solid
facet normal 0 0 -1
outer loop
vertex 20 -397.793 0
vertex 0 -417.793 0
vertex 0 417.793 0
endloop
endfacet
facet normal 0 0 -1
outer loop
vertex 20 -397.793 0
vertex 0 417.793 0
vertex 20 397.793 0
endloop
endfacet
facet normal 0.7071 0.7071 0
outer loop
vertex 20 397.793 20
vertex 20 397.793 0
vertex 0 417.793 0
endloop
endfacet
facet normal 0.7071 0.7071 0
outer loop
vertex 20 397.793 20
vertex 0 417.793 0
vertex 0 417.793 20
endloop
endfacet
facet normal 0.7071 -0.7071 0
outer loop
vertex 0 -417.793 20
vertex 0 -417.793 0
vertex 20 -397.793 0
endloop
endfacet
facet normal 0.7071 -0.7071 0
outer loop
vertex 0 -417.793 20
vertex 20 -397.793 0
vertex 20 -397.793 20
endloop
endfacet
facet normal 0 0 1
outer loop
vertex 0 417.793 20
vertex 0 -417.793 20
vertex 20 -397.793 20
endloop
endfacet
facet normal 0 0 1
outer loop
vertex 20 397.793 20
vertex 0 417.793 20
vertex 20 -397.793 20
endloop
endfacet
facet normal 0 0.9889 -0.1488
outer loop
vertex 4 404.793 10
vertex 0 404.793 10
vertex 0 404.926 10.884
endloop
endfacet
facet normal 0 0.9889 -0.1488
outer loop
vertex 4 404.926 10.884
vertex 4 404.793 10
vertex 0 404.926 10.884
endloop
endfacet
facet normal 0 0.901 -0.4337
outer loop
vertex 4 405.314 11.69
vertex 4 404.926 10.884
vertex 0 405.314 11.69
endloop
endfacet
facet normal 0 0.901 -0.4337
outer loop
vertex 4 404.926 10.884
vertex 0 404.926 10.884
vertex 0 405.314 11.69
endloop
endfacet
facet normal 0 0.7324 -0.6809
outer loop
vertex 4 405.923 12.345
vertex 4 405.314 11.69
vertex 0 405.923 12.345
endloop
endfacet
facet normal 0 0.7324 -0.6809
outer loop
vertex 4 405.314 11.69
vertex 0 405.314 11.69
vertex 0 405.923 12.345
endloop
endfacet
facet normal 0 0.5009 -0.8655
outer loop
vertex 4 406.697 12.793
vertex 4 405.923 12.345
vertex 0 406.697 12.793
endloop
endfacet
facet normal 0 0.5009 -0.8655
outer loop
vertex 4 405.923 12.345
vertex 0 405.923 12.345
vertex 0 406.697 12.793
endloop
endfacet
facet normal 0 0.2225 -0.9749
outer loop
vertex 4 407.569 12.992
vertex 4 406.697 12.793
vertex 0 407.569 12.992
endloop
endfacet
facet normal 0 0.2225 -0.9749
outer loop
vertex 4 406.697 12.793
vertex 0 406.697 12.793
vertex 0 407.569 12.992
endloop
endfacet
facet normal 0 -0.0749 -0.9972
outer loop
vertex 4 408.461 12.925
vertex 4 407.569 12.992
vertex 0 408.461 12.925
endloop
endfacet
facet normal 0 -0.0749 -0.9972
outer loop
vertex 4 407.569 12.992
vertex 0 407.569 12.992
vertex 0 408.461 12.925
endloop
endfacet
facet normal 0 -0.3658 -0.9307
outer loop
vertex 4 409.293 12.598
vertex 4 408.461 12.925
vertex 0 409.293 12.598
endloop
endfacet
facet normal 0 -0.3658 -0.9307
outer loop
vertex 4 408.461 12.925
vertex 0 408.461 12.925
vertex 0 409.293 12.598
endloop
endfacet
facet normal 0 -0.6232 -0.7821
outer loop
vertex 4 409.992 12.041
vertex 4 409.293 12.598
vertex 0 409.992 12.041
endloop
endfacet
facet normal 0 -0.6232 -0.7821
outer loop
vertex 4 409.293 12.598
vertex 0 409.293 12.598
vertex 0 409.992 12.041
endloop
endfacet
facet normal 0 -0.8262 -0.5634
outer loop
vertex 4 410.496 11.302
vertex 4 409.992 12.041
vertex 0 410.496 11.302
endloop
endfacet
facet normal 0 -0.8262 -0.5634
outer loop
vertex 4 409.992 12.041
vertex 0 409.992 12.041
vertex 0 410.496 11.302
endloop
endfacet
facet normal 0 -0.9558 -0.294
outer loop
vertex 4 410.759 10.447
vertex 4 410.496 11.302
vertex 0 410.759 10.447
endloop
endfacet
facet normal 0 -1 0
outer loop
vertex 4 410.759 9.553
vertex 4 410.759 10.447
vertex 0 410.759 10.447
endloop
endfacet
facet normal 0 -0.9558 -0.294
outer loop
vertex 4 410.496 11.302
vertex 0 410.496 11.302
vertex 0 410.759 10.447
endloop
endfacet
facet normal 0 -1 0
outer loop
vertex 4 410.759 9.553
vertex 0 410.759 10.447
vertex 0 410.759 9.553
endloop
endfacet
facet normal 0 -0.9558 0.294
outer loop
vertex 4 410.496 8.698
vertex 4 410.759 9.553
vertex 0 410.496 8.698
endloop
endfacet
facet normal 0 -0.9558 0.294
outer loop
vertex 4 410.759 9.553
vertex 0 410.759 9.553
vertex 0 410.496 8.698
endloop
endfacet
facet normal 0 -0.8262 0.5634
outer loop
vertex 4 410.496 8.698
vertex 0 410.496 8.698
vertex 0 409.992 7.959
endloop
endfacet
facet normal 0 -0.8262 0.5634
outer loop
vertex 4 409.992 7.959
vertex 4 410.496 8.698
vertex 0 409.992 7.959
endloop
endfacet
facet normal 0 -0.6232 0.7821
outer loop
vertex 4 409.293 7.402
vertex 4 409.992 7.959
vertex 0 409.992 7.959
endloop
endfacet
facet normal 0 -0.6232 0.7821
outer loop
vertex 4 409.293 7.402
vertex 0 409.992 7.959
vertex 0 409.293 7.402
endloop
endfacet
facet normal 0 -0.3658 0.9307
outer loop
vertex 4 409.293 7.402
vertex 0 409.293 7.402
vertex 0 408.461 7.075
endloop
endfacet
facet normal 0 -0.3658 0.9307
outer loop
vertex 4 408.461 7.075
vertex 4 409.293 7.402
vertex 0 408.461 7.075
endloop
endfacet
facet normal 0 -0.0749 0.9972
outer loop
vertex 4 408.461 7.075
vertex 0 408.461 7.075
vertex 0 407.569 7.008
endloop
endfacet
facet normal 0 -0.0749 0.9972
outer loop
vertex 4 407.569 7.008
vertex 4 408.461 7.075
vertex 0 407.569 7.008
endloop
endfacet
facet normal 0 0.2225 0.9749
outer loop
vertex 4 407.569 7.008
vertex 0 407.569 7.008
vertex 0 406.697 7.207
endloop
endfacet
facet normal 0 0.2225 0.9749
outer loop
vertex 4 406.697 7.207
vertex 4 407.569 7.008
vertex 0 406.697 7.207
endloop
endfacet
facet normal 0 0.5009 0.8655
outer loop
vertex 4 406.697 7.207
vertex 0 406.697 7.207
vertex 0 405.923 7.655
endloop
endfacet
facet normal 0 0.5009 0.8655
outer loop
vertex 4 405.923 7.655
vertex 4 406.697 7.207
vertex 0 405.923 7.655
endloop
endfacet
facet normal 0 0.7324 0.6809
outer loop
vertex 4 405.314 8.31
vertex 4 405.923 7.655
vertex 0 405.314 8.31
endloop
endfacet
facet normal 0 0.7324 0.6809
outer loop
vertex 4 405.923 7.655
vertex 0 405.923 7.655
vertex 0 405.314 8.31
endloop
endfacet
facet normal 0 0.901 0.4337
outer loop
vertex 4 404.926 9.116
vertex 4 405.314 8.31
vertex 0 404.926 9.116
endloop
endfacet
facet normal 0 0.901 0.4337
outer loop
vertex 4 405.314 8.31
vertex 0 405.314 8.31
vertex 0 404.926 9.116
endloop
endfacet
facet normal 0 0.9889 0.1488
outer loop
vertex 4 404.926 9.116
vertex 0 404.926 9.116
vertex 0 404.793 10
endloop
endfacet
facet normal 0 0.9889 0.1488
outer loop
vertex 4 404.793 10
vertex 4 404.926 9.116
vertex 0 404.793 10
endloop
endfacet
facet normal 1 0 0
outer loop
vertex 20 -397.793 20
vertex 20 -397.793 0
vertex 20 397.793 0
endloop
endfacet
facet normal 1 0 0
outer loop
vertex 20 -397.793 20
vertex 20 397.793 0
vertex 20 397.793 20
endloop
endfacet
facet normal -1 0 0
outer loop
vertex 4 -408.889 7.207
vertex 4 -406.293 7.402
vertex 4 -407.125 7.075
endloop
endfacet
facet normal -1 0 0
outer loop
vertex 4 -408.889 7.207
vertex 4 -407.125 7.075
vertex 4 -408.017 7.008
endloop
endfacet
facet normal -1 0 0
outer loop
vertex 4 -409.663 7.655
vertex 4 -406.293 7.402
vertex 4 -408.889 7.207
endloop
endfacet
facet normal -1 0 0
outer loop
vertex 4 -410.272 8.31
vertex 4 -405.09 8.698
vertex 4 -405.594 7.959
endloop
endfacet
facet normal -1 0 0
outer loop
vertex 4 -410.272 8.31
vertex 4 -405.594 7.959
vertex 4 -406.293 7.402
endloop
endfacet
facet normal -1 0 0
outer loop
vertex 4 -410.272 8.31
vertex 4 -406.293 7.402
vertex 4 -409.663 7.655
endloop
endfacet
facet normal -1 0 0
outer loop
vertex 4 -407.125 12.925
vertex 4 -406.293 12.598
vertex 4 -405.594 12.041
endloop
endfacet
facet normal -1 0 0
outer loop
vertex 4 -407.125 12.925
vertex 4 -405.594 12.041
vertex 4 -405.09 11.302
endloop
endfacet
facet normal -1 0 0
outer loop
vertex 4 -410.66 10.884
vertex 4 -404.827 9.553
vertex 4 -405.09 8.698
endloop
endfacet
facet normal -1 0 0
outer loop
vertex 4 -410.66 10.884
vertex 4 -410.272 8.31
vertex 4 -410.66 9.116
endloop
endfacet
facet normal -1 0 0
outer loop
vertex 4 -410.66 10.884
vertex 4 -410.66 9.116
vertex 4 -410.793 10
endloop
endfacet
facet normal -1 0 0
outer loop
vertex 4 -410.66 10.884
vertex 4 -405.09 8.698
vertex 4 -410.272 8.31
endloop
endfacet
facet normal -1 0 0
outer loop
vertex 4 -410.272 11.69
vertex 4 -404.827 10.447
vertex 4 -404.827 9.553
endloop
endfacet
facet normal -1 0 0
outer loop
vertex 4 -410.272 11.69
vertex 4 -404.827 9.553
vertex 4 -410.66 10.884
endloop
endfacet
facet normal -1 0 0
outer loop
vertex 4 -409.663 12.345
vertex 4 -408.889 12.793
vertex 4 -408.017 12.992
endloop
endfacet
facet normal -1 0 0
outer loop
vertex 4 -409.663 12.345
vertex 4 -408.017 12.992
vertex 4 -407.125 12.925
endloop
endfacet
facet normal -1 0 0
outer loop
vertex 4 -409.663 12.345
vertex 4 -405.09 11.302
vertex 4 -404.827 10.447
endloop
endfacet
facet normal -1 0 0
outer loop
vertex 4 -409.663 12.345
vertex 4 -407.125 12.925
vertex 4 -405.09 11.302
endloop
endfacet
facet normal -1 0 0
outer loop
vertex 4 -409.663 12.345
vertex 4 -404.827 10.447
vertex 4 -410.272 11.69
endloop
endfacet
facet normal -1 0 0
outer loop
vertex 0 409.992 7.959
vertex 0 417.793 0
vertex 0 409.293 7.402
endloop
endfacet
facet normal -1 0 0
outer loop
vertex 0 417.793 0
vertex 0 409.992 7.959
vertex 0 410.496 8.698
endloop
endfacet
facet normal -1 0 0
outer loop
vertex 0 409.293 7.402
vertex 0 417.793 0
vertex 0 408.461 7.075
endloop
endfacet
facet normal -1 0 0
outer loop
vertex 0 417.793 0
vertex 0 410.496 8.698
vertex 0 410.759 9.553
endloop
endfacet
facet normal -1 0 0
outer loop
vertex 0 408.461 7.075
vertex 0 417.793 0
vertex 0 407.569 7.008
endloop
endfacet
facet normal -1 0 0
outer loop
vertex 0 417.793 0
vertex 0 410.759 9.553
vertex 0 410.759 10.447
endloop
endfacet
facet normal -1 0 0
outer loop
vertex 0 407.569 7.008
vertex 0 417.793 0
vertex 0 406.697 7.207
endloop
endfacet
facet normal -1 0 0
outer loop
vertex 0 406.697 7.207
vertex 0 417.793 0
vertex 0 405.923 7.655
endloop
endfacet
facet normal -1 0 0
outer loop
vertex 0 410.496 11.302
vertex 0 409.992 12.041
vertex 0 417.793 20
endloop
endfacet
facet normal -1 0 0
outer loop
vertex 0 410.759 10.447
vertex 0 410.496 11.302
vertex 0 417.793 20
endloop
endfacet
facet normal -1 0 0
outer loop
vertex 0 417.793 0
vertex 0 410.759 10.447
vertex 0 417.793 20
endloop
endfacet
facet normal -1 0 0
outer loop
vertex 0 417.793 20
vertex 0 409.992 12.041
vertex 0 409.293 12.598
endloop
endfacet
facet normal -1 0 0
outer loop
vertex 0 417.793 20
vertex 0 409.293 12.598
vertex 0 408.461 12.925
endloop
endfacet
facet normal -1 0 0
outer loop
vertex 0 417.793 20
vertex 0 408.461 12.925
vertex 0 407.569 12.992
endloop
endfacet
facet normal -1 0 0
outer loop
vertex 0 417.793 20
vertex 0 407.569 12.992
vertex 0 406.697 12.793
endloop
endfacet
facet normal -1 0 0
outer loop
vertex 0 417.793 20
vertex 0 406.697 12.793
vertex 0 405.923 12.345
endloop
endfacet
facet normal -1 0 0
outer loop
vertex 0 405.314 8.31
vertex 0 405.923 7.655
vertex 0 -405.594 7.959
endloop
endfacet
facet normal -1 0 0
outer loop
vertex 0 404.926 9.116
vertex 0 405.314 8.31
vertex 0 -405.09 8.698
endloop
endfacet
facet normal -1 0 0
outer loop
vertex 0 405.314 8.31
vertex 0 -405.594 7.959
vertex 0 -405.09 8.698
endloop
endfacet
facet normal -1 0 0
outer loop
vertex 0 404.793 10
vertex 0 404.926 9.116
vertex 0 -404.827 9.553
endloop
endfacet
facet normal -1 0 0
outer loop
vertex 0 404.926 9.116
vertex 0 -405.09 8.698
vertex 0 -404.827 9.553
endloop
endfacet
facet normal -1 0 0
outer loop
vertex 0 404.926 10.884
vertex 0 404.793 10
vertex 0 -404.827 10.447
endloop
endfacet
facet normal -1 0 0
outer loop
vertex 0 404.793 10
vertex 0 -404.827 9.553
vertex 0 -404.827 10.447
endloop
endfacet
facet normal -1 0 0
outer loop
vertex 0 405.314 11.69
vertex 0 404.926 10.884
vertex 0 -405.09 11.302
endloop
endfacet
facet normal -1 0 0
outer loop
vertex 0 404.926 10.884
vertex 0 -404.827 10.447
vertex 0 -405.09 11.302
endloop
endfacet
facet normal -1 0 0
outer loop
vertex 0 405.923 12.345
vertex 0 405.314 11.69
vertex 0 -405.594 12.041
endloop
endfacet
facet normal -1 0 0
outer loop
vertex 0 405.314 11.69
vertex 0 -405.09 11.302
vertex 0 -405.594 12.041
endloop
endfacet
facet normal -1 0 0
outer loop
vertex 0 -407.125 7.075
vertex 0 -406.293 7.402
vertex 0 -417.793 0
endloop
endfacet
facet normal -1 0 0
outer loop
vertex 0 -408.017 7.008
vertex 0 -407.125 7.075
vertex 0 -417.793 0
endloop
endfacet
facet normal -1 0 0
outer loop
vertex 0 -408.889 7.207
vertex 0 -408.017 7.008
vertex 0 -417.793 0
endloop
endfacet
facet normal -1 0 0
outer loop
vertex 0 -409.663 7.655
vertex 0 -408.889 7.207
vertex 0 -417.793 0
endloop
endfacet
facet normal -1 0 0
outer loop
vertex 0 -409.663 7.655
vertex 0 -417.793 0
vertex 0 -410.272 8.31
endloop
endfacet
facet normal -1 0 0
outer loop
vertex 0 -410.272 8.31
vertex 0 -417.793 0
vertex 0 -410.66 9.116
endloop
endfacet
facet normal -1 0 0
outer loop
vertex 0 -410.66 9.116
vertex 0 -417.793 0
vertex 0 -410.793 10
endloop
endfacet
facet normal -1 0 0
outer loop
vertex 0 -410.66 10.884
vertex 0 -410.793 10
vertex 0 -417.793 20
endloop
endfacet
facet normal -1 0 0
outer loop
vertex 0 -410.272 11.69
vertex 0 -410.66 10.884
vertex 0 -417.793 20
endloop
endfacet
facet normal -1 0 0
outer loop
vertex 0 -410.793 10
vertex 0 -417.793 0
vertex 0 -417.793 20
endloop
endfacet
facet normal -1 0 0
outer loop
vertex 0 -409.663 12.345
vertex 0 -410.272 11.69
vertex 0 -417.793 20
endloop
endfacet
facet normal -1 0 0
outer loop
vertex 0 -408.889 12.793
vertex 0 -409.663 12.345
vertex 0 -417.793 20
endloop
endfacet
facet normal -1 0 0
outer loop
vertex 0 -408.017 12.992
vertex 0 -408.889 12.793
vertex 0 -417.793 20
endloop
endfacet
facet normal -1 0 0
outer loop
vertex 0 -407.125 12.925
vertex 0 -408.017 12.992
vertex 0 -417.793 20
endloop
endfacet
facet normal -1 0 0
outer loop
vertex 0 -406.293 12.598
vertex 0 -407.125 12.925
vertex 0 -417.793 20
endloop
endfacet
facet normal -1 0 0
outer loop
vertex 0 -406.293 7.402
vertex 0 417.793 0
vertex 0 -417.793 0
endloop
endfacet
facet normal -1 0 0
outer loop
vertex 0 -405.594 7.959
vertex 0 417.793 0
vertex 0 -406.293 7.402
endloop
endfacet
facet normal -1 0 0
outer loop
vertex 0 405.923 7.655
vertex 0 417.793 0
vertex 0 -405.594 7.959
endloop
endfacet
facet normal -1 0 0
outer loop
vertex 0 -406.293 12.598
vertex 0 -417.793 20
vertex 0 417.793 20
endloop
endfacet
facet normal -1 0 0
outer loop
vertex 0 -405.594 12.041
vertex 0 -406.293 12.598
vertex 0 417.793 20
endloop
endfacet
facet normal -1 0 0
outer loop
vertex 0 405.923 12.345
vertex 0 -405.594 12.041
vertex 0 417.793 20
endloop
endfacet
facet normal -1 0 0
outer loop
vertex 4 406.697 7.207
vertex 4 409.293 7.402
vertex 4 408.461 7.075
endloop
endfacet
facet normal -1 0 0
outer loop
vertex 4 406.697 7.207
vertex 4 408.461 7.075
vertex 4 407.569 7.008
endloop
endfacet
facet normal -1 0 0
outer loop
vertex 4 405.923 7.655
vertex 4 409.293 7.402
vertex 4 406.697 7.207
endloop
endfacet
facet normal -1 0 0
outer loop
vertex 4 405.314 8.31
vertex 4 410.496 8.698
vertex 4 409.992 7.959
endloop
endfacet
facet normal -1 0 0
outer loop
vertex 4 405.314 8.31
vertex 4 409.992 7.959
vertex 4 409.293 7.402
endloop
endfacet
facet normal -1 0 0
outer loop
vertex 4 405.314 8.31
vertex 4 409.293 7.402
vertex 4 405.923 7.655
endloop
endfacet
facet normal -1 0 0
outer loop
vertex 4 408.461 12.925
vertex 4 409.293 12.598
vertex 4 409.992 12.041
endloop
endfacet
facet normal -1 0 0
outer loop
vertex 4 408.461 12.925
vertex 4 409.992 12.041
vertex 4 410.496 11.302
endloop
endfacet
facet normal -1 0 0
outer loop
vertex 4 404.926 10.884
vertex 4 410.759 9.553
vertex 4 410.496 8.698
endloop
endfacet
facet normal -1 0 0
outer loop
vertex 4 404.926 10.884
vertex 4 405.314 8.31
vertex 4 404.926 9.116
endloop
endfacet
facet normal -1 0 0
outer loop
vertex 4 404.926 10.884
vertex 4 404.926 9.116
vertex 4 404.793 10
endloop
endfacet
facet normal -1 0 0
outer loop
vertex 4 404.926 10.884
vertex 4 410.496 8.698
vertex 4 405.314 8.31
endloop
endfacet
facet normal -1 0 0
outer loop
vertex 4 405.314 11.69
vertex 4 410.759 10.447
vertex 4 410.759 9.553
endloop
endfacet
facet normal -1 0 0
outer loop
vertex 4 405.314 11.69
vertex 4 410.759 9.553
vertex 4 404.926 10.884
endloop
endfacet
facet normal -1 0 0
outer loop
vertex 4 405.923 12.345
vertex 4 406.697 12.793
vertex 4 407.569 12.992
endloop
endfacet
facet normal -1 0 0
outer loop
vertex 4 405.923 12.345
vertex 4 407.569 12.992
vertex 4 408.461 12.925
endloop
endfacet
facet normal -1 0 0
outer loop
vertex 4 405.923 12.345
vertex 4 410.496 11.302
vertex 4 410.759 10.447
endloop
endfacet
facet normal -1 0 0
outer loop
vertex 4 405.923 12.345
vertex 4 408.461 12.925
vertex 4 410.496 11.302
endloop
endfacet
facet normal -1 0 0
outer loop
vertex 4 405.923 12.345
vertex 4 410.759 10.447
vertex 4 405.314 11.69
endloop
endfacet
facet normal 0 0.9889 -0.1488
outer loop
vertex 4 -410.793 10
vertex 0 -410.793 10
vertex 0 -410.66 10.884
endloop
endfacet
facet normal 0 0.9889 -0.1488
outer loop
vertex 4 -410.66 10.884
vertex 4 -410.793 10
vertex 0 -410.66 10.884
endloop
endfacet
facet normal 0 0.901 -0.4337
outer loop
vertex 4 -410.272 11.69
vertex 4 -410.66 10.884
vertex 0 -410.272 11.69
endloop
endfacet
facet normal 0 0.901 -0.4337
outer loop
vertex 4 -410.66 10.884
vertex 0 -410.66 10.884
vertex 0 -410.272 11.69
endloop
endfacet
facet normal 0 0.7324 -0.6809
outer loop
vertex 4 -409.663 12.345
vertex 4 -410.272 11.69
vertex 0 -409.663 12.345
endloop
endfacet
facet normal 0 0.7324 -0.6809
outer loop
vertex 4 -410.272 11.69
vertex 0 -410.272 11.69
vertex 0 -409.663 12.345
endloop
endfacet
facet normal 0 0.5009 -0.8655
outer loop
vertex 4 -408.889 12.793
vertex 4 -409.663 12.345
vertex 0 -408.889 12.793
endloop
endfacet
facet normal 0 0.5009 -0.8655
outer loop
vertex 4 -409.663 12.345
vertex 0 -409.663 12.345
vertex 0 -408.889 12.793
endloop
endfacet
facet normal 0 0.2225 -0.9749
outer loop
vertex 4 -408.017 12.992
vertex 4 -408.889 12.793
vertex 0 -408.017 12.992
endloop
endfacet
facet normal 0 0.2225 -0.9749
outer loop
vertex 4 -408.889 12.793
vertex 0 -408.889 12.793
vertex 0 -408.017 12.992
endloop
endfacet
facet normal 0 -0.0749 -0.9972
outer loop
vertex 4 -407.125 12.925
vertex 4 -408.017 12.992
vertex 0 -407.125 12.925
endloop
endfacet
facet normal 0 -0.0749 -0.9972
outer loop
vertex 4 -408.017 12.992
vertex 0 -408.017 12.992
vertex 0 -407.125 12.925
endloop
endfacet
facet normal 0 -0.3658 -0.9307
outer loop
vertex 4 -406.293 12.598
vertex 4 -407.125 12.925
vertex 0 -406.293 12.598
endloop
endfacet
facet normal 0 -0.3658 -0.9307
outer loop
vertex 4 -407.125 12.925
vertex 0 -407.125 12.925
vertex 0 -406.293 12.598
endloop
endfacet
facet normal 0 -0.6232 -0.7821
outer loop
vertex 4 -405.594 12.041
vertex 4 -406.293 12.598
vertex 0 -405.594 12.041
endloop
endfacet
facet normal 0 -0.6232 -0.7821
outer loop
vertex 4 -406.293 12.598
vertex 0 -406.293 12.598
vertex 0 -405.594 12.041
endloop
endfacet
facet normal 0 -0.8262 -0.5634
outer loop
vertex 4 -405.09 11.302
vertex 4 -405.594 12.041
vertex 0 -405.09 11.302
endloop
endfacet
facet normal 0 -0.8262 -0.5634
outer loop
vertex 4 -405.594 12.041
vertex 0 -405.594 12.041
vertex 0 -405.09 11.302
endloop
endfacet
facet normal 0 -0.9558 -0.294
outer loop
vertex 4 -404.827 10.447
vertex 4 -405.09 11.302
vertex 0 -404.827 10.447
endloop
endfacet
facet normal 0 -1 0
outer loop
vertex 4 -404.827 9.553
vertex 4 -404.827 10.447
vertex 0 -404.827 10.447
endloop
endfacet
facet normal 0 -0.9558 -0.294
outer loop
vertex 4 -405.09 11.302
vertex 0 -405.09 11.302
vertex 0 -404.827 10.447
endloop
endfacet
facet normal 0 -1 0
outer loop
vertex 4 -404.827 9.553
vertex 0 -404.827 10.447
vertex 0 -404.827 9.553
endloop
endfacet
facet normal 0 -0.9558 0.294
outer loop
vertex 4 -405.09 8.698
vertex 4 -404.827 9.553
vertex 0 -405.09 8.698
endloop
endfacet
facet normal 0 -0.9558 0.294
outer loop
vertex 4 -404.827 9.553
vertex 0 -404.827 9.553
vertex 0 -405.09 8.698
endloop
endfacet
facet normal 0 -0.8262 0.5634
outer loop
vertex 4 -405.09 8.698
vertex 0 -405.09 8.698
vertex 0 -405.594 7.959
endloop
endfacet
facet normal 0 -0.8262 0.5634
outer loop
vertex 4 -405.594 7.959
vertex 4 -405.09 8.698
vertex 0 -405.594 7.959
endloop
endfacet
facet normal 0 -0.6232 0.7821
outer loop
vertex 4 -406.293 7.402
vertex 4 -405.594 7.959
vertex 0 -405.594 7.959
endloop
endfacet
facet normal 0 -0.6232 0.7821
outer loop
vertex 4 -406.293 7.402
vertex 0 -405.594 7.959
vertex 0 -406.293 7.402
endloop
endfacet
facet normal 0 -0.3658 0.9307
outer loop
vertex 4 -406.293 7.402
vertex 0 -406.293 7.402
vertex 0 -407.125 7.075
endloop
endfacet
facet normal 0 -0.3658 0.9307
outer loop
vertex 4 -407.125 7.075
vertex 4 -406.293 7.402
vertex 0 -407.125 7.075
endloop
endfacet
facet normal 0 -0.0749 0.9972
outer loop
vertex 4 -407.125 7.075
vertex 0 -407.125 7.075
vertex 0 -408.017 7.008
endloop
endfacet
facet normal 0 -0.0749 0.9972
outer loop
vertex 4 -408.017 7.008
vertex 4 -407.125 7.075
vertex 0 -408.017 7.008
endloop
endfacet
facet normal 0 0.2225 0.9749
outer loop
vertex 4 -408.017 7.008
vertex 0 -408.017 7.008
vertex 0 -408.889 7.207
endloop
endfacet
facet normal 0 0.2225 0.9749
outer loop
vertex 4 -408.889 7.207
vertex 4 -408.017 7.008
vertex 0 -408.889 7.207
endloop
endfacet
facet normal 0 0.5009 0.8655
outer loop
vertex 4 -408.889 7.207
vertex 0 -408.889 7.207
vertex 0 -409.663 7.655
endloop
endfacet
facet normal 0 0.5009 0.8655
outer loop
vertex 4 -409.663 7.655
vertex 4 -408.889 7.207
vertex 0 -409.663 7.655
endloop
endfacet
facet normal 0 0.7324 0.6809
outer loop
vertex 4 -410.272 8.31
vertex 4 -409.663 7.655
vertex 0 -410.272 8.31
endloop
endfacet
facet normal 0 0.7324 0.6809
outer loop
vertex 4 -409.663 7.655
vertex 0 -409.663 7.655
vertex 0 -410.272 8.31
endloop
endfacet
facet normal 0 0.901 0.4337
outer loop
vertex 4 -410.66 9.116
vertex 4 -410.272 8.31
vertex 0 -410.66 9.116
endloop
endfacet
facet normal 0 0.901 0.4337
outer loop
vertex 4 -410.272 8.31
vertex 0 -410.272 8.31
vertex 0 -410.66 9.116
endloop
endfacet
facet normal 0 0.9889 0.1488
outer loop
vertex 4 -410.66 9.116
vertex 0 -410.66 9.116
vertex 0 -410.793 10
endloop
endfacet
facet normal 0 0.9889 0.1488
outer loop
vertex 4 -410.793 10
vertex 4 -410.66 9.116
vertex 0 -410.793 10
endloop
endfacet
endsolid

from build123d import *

# Parameters (mm, degrees)
F0_W     = 20
F0_H     = 20
F1_DEPTH = 417.793
F2_SIZE2 = 19.99999
F2_SIZE  = 19.99999
F3_SIZE  = 19.99999
F4_R     = 3
F5_DEPTH = 4
F6_R     = 3
F7_DEPTH = 4


# Not quite as in the source:
# - a fillet or chamfer is up to 0.001 mm smaller than in the source, because OpenCascade refuses the exact size


with BuildPart() as f1:
    # F0 (on Front) → F1 (new body, symmetric)
    with BuildSketch(Plane.XZ):
        with Locations((10, 10)):
            Rectangle(F0_W, F0_H)
    extrude(amount=F1_DEPTH, both=True)

    # F2 (size 20 and 20 in the source; OpenCascade refuses exactly that, so slightly less here)
    f2_edges = [f1.edges().sort_by_distance(p)[0] for p in [
        (20, -417.793, 10),
    ]]
    chamfer(f2_edges, length=F2_SIZE, length2=F2_SIZE2)

    # F3 (size 20 in the source; OpenCascade refuses exactly that, so slightly less here)
    f3_edges = [f1.edges().sort_by_distance(p)[0] for p in [
        (20, 417.793, 10),
    ]]
    chamfer(f3_edges, length=F3_SIZE)

    # F4 (on face) → F5 (cut)
    with BuildSketch(Plane(origin=(0, 0, 0), x_dir=(0, -1, 0), z_dir=(-1, 0, 0))):
        with Locations((-407.793, 10)):
            Circle(F4_R)
    extrude(amount=-F5_DEPTH, mode=Mode.SUBTRACT)

    # F6 (on face) → F7 (cut)
    with BuildSketch(Plane(origin=(0, 0, 0), x_dir=(0, -1, 0), z_dir=(-1, 0, 0))):
        with Locations((407.793, 10)):
            Circle(F6_R)
    extrude(amount=-F7_DEPTH, mode=Mode.SUBTRACT)


solid = f1.part
